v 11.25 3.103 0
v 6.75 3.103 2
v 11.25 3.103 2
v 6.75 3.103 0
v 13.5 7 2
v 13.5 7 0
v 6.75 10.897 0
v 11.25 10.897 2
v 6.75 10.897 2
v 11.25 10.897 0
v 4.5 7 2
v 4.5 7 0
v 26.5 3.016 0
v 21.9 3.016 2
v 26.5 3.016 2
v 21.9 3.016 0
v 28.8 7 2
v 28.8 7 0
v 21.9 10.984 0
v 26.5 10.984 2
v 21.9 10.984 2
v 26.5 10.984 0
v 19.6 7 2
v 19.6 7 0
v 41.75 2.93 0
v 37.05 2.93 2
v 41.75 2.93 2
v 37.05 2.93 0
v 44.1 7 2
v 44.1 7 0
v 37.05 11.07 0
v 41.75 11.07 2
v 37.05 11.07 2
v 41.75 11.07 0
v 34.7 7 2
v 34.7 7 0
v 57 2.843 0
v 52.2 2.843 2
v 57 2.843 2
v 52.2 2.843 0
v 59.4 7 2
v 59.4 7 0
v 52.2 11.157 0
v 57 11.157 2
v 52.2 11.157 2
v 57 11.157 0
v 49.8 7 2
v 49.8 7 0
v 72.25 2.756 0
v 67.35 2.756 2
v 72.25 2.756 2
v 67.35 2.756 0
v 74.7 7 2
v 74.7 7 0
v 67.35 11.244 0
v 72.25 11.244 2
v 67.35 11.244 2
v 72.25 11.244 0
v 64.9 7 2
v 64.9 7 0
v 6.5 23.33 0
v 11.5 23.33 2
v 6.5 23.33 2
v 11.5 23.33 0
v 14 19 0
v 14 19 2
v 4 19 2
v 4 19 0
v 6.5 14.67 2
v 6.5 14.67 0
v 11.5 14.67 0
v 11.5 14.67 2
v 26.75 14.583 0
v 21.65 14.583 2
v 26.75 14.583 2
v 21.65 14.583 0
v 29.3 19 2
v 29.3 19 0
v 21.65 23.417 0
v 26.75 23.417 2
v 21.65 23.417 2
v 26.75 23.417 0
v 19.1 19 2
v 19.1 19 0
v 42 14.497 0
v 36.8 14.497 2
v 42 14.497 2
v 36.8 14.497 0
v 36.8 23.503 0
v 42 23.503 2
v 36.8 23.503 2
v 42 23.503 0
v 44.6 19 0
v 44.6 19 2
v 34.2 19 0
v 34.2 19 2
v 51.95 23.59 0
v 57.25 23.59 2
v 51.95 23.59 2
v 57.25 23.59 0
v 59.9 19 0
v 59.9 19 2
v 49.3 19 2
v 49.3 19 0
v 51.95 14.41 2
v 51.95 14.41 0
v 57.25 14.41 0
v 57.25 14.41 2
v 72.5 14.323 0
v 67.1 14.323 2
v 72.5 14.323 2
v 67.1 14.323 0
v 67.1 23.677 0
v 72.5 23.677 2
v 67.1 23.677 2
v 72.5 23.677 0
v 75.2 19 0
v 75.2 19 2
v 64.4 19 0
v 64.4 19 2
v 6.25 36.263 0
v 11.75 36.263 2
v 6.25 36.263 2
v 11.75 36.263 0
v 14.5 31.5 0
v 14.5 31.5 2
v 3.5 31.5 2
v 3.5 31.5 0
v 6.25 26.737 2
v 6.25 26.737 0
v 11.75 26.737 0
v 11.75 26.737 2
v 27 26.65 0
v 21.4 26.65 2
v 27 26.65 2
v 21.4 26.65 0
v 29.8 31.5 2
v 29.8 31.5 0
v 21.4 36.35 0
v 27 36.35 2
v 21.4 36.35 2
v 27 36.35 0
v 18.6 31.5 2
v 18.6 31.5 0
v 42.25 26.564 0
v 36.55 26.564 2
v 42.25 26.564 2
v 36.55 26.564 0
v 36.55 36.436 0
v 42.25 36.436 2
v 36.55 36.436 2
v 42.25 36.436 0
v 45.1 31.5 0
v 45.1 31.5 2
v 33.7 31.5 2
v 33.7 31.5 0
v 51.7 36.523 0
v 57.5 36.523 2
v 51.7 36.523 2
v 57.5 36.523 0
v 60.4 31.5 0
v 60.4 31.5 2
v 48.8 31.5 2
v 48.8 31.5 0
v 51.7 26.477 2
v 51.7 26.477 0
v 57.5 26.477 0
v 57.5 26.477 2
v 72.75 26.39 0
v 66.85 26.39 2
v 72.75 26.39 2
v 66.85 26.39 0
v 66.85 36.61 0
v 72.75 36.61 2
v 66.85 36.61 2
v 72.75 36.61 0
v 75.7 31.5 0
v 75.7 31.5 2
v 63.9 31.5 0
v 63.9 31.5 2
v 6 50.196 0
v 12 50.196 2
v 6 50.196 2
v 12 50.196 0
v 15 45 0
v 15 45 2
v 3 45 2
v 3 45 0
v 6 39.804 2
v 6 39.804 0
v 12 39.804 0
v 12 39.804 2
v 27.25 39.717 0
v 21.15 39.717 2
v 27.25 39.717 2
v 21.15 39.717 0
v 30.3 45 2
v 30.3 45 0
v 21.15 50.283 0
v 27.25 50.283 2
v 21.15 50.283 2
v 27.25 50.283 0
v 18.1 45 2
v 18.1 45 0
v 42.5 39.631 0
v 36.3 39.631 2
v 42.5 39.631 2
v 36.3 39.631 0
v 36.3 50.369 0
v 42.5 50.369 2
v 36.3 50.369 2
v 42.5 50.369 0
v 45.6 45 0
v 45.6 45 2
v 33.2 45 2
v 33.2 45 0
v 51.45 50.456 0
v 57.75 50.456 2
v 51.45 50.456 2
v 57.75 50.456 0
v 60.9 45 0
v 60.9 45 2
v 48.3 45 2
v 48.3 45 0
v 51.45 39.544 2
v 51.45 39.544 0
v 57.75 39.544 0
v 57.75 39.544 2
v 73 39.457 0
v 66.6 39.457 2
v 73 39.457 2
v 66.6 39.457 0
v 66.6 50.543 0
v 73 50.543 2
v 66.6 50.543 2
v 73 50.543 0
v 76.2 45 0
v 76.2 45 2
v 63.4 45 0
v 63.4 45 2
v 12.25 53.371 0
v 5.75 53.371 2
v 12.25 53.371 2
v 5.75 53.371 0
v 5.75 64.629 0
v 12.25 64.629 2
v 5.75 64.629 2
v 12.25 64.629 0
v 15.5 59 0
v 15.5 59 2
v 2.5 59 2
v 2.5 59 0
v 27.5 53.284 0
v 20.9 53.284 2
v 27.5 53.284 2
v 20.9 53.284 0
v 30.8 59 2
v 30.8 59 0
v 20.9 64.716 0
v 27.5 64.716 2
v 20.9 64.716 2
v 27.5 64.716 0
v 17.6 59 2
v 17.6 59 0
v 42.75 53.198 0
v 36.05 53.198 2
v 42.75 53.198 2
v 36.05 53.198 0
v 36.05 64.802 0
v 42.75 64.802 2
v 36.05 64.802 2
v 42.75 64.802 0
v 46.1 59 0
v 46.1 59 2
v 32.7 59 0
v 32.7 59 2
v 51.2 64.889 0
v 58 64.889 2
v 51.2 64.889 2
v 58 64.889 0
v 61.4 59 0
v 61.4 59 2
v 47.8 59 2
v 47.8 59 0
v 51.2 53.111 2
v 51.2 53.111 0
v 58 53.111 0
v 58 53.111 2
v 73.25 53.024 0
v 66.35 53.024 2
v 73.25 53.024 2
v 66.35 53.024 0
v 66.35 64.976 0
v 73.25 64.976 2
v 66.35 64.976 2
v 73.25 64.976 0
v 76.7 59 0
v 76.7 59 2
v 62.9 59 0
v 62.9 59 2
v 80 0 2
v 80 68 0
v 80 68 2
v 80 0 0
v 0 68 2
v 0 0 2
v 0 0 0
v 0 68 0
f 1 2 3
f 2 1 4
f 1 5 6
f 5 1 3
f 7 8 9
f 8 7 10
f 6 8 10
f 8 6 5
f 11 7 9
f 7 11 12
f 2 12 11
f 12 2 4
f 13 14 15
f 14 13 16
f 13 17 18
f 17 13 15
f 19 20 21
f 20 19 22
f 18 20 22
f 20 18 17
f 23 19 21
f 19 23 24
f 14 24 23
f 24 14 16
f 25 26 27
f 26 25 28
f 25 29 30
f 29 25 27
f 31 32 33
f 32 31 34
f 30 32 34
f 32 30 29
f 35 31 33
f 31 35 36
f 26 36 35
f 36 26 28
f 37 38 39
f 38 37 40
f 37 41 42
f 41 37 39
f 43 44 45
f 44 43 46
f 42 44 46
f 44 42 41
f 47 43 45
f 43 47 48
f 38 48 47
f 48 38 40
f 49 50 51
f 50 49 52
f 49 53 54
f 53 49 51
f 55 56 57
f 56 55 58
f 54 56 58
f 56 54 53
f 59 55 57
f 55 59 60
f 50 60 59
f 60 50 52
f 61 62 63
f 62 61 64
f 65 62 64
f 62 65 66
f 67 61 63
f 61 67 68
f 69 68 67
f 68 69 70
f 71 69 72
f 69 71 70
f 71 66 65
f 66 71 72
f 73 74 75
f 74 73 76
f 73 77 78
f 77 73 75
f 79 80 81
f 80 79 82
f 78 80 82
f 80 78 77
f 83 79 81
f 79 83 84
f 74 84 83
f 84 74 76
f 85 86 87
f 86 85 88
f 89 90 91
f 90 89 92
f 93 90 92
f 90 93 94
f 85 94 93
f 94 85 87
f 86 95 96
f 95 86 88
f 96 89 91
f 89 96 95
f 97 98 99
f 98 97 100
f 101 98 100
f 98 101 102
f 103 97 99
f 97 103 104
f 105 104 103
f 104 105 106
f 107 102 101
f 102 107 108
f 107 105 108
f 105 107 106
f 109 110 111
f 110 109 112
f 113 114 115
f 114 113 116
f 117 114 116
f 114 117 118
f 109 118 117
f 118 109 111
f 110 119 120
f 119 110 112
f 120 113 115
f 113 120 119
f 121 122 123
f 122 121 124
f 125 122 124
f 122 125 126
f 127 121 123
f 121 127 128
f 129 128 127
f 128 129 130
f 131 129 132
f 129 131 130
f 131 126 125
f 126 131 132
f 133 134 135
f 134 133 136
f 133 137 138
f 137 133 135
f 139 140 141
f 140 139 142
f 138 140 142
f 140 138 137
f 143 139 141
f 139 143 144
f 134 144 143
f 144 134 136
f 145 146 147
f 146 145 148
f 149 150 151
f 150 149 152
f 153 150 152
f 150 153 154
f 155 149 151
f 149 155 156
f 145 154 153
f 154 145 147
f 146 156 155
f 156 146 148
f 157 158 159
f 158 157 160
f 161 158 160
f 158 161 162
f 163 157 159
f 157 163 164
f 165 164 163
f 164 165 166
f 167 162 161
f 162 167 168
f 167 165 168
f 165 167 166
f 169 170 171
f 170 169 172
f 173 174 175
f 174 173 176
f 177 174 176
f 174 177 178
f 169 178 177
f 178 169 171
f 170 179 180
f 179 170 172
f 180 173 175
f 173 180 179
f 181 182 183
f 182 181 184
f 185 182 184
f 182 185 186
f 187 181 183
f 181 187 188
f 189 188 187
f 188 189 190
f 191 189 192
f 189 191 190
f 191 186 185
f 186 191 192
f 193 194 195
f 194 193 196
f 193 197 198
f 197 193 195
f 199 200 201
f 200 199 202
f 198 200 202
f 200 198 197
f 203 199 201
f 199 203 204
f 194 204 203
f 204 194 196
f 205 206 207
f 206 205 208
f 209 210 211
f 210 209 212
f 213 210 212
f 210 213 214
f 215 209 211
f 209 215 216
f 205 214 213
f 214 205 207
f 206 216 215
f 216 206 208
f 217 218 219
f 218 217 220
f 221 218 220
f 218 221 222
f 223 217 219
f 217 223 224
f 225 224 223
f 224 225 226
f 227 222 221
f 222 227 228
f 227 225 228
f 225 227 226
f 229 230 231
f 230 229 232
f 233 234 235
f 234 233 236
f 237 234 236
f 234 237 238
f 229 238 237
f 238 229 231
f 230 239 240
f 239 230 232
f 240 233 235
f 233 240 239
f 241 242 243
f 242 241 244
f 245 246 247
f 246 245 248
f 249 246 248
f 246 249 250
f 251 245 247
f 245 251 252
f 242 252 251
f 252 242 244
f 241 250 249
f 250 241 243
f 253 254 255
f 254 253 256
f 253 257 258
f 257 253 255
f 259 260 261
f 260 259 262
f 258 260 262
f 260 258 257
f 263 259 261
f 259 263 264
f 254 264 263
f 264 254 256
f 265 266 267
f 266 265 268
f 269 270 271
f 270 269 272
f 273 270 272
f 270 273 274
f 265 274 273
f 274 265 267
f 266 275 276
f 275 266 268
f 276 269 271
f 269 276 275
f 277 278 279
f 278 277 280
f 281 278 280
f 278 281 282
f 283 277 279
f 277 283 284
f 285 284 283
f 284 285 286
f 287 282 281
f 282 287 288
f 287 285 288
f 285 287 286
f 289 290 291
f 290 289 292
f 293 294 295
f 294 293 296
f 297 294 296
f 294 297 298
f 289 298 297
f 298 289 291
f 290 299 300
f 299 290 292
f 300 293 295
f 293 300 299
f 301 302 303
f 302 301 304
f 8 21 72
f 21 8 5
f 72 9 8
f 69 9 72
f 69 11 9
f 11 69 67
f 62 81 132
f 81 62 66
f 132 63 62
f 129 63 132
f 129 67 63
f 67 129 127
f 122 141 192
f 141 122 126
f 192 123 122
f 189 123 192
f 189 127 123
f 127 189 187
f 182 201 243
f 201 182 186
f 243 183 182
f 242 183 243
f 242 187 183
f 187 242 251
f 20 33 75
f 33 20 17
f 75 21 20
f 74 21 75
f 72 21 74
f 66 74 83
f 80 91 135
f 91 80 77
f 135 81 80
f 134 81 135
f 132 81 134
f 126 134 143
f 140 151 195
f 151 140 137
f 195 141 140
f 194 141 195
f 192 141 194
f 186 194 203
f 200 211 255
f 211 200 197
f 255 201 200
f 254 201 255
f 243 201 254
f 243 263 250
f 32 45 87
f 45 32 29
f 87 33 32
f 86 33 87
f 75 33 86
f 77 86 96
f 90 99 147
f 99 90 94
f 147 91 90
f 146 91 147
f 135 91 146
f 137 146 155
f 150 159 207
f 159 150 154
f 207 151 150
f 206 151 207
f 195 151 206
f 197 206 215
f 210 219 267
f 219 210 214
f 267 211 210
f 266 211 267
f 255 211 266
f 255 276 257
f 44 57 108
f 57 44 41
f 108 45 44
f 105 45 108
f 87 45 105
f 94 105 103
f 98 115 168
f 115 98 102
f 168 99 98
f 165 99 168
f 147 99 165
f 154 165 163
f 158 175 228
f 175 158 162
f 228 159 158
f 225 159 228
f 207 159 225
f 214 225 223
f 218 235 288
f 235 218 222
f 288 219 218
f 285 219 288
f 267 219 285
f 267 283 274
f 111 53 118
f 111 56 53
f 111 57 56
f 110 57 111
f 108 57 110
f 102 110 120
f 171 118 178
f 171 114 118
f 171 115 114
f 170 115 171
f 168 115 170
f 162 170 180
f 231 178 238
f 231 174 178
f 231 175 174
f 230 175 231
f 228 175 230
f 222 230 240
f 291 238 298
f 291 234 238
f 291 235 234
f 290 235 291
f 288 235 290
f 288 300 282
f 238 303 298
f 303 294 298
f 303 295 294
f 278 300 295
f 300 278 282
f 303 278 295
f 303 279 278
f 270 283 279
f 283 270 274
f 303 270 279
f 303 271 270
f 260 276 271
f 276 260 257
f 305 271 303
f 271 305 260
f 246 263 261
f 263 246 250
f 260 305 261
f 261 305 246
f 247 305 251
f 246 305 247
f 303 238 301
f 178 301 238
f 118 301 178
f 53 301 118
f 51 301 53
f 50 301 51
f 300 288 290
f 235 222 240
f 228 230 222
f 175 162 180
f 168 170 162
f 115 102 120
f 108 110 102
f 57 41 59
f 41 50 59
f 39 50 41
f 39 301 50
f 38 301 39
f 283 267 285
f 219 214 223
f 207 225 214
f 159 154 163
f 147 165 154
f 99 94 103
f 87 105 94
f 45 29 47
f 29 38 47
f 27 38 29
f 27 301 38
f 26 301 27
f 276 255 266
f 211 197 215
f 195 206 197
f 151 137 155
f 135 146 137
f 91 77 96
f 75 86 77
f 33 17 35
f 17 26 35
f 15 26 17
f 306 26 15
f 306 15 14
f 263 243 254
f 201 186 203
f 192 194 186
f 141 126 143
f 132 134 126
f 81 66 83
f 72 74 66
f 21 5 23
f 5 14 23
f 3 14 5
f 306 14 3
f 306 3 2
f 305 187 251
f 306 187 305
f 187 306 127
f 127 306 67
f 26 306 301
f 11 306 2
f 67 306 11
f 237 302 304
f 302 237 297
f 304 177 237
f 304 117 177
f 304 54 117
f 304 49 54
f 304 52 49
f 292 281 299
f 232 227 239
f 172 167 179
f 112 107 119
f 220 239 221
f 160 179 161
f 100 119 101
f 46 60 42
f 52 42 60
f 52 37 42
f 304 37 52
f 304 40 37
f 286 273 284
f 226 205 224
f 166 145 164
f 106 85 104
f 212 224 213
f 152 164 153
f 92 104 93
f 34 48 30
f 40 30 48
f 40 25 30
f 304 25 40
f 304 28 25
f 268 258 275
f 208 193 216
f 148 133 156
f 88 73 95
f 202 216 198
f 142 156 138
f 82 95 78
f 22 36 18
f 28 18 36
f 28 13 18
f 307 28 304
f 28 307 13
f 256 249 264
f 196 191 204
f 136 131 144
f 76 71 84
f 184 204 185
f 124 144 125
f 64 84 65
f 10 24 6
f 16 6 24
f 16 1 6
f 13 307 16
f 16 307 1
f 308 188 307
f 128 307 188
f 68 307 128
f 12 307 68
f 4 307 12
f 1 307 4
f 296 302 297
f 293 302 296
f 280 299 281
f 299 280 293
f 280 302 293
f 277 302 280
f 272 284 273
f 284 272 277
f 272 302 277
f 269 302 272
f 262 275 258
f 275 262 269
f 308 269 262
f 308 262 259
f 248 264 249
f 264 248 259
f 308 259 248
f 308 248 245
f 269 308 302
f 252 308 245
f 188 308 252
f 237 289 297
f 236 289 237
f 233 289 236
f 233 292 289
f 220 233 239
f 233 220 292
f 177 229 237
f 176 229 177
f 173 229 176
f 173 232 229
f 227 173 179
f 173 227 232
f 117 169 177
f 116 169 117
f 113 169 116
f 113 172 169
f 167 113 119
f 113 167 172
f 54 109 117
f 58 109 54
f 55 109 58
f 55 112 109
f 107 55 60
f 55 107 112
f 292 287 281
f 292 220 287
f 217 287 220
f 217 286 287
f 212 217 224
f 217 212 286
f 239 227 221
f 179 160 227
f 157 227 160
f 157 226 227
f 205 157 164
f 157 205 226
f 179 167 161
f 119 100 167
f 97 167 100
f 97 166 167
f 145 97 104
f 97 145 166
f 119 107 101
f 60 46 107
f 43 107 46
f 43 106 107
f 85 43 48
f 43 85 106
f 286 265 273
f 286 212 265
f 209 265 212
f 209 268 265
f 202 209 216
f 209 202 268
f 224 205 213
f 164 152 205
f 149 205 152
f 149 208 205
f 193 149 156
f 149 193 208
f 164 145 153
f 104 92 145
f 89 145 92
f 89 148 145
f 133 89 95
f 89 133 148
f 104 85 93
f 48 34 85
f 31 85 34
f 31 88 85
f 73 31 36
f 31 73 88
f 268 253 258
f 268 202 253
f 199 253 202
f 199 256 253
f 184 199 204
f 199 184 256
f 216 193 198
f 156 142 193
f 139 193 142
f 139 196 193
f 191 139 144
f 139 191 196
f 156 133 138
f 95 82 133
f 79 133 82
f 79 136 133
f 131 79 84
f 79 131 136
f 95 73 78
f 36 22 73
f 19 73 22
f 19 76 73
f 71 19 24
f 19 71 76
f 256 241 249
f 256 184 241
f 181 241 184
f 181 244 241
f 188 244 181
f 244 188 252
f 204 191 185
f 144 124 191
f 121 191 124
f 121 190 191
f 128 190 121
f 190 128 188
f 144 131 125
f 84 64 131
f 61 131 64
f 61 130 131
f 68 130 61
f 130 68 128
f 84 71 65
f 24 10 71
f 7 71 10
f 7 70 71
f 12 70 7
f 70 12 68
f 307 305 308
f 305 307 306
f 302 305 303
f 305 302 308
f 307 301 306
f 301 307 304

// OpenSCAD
//difference() {
//    cube([52, 40, 2]);
//
//    translate([0, 5, -1]) {
//        for (i=[0:4]) {
//            translate([5+i*10.1, -1, 0]) cylinder($fn=6, h=4, d=4+i*0.2);
//        }
//        
//        for (i=[0:4]) {
//            translate([5+i*10.1, 5, 0]) cylinder($fn=6, h=4, d=5+i*0.2);
//        }
//        
//        for (i=[0:4]) {
//            translate([5+i*10.1, 12, 0]) cylinder($fn=6, h=4, d=6+i*0.2);
//        }
//        
//        for (i=[0:4]) {
//            translate([5+i*10.1, 20, 0]) cylinder($fn=6, h=4, d=7+i*0.2);
//        }
//        
//        for (i=[0:4]) {
//            translate([5+i*10.1, 29, 0]) cylinder($fn=6, h=4, d=8+i*0.2);
//        }
//    }
//}

difference() {
    cube([80, 68, 2]);

    translate([0, 5, -1]) {
        for (i=[0:4]) {
            translate([9+i*15.2, 2, 0]) cylinder($fn=6, h=4, d=9+i*0.2);
        }
        
        for (i=[0:4]) {
            translate([9+i*15.2, 14, 0]) cylinder($fn=6, h=4, d=10+i*0.2);
        }
        
        for (i=[0:4]) {
            translate([9+i*15.2, 26.5, 0]) cylinder($fn=6, h=4, d=11+i*0.2);
        }
        
        for (i=[0:4]) {
            translate([9+i*15.2, 40, 0]) cylinder($fn=6, h=4, d=12+i*0.2);
        }
        
        for (i=[0:4]) {
            translate([9+i*15.2, 54, 0]) cylinder($fn=6, h=4, d=13+i*0.2);
        }
    }
}
